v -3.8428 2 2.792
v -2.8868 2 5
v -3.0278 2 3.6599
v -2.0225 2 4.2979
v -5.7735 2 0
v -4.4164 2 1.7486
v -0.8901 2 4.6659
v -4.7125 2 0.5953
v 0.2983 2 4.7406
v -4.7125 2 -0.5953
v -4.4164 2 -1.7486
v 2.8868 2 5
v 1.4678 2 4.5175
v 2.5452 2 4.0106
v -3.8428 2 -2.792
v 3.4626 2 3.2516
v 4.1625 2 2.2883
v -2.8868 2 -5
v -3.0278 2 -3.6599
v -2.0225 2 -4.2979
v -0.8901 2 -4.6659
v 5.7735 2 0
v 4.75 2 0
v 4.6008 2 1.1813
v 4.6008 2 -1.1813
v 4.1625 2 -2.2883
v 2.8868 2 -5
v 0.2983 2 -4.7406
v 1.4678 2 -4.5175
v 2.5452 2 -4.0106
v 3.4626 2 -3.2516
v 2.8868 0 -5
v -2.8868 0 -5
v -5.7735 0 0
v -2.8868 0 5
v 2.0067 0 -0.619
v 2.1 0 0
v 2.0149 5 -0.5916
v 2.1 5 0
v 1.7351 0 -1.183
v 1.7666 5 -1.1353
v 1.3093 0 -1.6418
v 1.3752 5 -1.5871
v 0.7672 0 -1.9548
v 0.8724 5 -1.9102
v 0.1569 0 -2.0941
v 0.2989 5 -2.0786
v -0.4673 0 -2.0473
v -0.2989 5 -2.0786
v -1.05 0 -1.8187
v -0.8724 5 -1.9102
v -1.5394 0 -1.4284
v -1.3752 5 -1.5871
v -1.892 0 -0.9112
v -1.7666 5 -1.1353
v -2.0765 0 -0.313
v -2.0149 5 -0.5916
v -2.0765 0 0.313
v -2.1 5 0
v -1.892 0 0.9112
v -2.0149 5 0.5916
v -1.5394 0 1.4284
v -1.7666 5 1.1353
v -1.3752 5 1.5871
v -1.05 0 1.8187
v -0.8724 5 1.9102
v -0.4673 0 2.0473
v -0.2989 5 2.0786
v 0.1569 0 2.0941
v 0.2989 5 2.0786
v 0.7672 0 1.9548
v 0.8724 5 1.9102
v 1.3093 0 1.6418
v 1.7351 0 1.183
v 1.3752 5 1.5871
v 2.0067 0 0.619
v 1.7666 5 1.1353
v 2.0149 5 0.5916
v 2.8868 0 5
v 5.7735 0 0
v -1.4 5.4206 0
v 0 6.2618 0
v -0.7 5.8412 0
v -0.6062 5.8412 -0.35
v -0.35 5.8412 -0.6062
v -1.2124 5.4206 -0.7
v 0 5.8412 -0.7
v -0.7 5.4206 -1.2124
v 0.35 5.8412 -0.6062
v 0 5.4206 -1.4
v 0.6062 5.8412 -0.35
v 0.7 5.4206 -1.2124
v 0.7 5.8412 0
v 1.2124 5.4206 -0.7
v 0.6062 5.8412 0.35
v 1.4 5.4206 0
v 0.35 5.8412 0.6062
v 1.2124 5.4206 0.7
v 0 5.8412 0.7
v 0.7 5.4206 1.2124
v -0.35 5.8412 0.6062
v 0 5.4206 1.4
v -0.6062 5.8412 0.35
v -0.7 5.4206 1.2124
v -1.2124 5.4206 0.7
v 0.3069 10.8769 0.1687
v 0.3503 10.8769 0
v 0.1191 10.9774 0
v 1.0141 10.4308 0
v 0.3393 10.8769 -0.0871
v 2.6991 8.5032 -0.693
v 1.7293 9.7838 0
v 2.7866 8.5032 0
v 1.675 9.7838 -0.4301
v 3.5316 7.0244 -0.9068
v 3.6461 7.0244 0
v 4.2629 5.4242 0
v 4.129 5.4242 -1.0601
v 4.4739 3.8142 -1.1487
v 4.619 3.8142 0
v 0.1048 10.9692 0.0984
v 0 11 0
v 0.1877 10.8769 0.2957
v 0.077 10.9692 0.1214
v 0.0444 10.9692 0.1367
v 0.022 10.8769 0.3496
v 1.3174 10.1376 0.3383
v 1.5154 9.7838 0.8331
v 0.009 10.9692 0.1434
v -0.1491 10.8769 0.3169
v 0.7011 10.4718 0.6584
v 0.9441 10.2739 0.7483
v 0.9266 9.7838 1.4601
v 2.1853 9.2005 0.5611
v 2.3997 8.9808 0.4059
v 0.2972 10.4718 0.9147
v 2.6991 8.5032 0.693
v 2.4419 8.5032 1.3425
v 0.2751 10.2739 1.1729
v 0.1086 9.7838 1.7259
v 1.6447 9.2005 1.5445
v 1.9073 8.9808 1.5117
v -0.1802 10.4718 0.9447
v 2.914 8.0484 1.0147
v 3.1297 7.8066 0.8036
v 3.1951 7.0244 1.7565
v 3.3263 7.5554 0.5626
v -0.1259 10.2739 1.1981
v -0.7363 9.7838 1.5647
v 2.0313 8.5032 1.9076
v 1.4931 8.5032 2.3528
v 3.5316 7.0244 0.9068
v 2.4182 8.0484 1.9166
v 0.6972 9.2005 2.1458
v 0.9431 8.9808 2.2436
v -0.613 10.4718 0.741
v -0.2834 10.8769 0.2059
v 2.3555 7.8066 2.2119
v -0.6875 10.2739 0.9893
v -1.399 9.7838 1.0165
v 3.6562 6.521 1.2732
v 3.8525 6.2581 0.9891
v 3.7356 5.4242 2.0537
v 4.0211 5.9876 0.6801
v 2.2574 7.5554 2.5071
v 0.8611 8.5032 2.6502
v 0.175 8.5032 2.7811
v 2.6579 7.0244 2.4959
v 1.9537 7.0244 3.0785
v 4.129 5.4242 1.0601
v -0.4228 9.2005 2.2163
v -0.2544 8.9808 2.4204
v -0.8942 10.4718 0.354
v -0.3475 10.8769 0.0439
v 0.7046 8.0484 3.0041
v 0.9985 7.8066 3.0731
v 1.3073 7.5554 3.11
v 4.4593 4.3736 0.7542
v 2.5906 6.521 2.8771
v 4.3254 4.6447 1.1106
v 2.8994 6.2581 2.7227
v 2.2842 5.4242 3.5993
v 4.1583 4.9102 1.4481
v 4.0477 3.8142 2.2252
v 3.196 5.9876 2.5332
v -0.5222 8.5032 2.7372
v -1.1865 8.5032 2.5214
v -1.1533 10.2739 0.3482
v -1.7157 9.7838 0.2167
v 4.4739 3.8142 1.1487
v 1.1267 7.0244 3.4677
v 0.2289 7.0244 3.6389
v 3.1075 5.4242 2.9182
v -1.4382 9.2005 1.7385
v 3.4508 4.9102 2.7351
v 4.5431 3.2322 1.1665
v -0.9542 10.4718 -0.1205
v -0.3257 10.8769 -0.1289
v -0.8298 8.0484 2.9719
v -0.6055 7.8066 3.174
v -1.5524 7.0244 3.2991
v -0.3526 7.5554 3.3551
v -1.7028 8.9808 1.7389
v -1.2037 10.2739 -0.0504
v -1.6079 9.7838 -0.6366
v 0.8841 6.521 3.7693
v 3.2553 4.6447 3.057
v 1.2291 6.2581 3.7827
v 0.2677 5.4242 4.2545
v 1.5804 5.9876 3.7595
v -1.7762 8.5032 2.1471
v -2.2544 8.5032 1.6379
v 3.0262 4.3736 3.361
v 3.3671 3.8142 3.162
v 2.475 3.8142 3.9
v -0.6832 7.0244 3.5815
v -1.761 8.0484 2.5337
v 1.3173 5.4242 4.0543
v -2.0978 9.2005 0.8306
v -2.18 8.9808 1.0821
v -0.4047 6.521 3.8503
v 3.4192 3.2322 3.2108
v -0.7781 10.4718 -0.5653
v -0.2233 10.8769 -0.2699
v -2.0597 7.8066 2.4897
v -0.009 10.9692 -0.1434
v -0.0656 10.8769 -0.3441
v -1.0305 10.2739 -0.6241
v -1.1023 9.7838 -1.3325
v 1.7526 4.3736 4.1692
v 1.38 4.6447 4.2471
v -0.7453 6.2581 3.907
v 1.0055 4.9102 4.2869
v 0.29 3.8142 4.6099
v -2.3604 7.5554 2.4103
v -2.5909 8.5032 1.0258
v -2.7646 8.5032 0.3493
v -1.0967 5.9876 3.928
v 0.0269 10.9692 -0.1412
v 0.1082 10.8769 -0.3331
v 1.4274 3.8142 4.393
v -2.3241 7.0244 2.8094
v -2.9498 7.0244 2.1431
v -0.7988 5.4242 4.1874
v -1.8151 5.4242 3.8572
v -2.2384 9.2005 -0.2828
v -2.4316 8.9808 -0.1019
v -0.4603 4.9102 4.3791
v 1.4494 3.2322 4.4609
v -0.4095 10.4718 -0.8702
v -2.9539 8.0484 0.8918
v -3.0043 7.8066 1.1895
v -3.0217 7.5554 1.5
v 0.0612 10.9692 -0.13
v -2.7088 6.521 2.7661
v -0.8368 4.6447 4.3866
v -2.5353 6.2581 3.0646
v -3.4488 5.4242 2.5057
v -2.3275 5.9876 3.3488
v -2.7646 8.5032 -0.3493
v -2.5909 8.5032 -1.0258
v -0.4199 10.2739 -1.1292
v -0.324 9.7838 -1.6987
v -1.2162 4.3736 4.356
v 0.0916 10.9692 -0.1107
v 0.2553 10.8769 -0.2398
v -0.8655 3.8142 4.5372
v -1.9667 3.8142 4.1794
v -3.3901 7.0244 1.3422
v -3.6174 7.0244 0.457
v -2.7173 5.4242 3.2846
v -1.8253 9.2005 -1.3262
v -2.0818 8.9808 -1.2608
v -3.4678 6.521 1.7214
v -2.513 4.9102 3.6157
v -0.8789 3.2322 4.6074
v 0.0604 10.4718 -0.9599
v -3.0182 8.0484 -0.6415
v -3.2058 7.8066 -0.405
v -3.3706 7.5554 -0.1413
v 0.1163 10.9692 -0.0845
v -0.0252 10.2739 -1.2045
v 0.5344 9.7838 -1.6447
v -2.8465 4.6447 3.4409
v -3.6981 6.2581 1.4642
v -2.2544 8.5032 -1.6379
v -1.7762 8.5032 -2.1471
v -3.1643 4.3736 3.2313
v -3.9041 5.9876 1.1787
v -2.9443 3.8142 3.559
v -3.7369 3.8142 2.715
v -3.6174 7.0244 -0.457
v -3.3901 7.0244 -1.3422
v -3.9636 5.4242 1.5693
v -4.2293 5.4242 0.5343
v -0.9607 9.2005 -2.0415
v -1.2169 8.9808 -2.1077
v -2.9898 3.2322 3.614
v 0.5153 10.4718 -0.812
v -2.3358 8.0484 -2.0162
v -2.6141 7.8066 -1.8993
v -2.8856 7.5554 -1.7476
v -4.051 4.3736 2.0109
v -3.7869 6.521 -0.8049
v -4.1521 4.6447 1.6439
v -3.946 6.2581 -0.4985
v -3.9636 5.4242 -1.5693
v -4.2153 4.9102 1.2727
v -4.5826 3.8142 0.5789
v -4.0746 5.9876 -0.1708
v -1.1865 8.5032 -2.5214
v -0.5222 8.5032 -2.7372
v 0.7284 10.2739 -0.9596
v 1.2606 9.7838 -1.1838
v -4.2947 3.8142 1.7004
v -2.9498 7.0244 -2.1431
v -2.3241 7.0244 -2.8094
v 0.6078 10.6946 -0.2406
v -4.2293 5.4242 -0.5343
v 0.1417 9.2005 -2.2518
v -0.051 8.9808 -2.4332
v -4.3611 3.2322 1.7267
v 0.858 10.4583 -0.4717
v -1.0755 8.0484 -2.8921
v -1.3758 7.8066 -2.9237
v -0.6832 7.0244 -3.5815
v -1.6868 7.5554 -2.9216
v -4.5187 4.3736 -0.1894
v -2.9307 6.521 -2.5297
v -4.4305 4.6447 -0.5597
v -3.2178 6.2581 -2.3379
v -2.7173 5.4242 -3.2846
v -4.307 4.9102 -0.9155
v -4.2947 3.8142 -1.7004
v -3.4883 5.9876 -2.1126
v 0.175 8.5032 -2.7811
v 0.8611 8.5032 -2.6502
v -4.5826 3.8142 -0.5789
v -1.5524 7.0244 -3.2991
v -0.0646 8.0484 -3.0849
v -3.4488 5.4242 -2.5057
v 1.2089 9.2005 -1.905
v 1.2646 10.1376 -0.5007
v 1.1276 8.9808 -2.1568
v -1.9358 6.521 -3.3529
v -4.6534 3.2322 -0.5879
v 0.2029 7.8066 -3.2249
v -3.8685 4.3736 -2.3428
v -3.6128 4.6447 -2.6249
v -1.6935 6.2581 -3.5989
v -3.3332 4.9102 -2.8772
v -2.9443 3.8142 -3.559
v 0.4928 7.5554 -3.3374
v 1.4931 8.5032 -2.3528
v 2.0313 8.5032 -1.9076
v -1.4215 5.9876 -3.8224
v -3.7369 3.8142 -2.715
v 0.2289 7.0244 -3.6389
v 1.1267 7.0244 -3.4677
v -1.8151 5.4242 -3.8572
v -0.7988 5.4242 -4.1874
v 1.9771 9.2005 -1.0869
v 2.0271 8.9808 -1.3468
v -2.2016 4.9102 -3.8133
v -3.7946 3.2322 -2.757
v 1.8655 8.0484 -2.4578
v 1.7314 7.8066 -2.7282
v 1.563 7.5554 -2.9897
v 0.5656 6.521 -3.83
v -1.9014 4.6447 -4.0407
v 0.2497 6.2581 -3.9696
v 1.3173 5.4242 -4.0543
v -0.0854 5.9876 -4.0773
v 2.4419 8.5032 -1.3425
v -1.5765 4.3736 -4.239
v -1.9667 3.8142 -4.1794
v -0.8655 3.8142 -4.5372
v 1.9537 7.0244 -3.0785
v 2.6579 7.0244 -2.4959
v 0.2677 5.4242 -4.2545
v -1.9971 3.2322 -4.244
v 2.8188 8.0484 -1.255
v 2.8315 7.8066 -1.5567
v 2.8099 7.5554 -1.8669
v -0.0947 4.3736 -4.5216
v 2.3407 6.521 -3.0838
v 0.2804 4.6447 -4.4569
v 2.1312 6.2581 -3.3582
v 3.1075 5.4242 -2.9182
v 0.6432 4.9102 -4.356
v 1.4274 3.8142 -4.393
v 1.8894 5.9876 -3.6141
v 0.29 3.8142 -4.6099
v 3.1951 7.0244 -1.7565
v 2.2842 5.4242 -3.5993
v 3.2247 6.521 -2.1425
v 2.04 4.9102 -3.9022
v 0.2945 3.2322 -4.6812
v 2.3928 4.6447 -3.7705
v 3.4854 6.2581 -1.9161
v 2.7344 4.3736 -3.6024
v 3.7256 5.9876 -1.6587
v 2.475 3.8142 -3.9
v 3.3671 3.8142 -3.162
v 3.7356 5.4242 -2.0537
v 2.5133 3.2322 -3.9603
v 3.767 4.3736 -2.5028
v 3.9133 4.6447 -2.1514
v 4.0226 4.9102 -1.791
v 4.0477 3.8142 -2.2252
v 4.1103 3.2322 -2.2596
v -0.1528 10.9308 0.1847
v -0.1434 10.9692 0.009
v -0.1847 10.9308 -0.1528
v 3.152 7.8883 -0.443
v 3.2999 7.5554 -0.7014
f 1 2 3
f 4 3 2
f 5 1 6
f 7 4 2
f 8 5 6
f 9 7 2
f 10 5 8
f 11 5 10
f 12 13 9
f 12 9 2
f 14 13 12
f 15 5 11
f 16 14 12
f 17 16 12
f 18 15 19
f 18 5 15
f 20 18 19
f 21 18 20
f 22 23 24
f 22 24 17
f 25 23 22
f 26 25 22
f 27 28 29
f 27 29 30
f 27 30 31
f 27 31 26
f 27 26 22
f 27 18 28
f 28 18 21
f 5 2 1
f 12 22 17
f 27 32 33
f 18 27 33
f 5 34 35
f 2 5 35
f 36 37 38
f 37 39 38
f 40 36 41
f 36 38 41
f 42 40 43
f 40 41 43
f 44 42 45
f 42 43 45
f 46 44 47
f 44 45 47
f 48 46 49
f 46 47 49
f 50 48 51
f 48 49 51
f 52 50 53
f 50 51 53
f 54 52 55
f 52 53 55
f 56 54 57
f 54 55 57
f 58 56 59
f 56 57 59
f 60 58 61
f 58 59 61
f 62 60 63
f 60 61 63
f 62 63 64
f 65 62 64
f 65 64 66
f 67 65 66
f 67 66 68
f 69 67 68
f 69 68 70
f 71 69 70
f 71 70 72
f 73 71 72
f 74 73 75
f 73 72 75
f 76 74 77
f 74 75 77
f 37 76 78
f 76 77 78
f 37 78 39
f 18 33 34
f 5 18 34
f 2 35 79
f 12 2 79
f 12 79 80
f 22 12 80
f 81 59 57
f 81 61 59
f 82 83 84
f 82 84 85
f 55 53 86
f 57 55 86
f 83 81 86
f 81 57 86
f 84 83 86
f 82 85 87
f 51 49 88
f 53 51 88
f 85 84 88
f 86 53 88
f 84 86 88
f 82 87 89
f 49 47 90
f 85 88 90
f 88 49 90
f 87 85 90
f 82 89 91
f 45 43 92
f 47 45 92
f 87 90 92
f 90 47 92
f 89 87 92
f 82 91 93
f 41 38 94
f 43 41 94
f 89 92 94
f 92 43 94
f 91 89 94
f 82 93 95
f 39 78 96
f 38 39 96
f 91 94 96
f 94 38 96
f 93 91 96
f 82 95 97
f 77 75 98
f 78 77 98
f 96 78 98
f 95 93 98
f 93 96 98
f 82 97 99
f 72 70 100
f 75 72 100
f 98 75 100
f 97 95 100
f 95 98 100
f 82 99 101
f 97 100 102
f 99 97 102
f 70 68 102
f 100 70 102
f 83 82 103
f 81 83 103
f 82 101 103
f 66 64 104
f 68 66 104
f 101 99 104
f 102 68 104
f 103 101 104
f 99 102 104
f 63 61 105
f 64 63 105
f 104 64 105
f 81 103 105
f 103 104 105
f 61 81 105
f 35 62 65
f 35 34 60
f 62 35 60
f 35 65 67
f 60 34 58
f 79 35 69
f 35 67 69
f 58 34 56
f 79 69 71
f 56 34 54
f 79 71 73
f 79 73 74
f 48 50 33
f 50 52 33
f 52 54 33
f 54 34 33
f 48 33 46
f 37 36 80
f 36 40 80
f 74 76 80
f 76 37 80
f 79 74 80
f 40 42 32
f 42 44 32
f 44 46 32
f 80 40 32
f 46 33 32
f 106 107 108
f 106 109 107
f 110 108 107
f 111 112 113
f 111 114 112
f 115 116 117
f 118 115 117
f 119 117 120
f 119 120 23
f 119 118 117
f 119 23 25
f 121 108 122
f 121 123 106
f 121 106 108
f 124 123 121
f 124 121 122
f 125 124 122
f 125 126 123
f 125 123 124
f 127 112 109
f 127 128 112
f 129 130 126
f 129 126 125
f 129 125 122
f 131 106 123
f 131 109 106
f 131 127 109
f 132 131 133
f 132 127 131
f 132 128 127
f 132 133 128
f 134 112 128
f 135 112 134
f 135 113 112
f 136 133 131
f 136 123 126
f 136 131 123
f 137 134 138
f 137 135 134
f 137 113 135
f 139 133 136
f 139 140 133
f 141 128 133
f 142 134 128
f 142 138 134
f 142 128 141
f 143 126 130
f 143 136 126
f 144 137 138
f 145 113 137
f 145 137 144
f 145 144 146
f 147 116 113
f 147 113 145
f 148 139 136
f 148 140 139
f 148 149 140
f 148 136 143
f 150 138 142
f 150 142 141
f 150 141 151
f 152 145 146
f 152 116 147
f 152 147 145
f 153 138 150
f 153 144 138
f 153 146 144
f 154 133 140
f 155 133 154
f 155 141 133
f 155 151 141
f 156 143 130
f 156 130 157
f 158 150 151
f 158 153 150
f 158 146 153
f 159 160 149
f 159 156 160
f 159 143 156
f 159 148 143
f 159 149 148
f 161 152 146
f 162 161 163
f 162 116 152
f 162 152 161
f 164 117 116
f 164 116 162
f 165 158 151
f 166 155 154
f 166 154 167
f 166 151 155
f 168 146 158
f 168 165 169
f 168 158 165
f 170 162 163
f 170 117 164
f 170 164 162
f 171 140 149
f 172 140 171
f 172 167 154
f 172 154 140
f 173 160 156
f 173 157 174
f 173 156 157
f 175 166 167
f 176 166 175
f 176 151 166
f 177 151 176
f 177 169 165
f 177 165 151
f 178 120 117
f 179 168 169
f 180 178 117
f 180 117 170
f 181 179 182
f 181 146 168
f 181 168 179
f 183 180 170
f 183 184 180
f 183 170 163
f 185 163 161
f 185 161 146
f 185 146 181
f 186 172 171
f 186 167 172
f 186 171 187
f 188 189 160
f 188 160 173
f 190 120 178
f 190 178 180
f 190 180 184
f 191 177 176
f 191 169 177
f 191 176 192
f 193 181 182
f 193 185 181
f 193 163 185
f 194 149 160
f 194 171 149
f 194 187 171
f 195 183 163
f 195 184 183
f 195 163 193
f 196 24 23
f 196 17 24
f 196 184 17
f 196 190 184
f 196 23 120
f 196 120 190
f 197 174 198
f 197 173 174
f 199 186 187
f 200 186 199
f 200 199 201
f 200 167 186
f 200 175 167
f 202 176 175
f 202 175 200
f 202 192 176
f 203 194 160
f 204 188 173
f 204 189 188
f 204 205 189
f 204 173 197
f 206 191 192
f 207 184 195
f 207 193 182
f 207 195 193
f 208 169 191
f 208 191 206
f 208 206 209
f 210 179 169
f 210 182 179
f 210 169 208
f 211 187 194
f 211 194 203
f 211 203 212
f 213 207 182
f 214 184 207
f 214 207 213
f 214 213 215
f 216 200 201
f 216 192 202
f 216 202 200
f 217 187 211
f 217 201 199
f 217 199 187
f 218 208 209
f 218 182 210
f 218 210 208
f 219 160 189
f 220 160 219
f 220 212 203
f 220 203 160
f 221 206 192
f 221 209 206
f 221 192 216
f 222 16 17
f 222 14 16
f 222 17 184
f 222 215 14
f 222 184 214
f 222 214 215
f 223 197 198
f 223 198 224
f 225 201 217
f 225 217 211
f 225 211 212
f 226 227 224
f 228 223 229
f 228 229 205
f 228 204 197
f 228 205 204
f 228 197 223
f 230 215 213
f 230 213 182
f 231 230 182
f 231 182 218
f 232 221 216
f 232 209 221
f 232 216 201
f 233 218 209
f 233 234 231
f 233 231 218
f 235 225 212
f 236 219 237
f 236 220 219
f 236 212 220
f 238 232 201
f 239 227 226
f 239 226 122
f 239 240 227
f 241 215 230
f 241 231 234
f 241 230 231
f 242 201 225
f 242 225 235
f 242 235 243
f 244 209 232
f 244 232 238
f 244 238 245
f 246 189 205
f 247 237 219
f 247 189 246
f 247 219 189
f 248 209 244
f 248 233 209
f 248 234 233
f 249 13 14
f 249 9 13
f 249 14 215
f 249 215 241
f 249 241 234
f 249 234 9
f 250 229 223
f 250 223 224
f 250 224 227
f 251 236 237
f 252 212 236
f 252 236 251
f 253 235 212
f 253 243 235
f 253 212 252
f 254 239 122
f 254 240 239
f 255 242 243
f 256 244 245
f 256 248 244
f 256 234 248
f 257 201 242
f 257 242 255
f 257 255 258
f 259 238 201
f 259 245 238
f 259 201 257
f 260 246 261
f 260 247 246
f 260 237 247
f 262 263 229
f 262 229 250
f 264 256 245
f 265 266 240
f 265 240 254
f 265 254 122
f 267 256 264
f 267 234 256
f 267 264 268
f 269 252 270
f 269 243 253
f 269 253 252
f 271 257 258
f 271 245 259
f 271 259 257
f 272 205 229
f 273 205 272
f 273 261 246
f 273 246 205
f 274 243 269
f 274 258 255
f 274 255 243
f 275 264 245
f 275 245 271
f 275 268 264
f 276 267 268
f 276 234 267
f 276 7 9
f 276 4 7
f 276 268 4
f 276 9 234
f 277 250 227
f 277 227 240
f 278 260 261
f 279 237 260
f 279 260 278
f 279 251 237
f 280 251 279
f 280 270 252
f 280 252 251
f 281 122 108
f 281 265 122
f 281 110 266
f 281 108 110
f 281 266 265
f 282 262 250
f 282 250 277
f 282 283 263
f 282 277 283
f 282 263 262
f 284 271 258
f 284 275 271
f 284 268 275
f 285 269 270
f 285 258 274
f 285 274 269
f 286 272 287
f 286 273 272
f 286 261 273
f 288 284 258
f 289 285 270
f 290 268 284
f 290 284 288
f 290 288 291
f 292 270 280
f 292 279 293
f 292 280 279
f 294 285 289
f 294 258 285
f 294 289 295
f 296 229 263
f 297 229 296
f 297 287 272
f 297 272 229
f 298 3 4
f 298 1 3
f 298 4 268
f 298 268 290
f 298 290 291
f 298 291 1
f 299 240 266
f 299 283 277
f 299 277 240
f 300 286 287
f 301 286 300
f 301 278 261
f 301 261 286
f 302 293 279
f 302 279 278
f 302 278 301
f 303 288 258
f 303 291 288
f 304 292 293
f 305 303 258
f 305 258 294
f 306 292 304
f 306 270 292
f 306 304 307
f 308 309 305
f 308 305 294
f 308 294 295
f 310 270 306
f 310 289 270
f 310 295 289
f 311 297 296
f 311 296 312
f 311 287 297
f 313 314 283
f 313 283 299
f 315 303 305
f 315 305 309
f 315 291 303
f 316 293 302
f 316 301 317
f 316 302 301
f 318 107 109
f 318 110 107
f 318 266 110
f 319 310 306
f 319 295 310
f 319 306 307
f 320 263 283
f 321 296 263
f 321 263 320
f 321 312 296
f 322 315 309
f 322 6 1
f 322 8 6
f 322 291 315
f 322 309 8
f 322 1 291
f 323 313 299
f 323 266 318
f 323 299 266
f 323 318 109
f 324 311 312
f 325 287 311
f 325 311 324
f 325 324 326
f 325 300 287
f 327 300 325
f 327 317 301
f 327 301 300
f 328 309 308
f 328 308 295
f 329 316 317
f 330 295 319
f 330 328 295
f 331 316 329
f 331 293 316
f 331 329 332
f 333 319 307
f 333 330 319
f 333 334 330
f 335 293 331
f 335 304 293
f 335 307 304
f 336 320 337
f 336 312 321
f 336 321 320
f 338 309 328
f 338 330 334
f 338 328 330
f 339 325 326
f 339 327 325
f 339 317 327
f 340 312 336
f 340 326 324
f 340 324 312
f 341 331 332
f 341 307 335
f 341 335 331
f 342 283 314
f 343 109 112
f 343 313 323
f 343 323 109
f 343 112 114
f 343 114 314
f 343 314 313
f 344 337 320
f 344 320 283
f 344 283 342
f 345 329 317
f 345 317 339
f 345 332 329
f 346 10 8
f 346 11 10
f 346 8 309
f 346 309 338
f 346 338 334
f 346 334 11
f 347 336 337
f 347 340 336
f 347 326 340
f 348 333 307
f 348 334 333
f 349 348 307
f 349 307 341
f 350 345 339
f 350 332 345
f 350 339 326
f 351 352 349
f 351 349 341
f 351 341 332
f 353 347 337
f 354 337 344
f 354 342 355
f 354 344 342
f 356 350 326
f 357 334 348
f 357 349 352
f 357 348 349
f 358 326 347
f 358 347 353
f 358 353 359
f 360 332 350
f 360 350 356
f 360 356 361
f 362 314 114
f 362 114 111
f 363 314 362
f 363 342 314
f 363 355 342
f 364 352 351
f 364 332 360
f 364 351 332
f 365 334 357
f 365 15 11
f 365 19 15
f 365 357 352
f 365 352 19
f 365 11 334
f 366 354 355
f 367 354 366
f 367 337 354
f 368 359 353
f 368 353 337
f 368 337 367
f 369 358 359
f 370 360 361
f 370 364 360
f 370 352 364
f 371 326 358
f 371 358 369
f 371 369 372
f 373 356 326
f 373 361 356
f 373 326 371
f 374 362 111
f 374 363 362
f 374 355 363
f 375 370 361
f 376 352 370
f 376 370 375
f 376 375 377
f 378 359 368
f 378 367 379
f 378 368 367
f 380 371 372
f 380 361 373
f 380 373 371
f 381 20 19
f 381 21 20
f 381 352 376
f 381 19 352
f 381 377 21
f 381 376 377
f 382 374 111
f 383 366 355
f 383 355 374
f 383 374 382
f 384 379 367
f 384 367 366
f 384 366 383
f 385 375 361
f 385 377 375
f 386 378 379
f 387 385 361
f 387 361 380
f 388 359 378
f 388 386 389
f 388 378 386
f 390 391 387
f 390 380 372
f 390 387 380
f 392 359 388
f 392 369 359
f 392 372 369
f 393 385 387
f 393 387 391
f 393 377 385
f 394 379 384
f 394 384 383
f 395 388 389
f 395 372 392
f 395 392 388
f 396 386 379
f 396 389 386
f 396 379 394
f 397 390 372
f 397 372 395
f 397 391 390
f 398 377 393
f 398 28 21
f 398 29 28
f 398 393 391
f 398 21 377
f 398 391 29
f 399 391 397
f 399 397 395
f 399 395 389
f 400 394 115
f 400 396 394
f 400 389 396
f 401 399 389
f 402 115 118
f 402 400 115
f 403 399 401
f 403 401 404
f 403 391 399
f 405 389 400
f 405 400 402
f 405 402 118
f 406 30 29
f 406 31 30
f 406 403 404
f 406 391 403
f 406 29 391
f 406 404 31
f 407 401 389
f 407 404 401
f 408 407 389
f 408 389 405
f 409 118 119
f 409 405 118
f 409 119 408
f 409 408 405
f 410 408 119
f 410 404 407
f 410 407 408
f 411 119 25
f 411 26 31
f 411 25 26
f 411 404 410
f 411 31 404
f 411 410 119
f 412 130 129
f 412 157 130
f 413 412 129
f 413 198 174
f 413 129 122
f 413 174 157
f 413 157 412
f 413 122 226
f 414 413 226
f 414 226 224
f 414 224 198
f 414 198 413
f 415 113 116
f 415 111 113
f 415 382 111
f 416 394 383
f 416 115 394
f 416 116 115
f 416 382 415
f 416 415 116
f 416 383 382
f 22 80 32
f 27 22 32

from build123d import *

# Parameters (mm, degrees)
BOSS_EXTRUDE1_DEPTH       = 2
M5X0_8_TAPPED_HOLE1_D     = 4.2
M5X0_8_TAPPED_HOLE1_DEPTH = 5
M5X0_8_TAPPED_HOLE1_TIP   = 1.2618073


with BuildPart() as part:
    # Sketch1 → Boss-Extrude1 (new body)
    with BuildSketch(Plane(origin=(0, 0, 0), x_dir=(1, 0, 0), z_dir=(0, 1, 0))):
        Polygon((2.886751346, 5), (-2.886751346, 5), (-5.773502692, 0), (-2.886751346, -5), (2.886751346, -5), (5.773502692, 0), align=None)
    extrude(amount=BOSS_EXTRUDE1_DEPTH)

    # Sketch2 → Revolve1 (revolve)
    with BuildSketch(Plane.XY):
        with BuildLine():
            Line((4.75, 2), (0, 2))
            Line((0, 2), (0, 11))
            add(Edge.make_bspline(
                [(0, 11), (0.622499022, 11), (4.75, 8.004236855), (4.75, 2)],
                knots=[0, 0, 0, 0, 1, 1, 1, 1], degree=3))
        make_face()
    revolve(axis=Axis((0, 11, 0), (0, -1, 0)))

    # M5x0.8 Tapped Hole1
    with Locations(Plane(origin=(0, 0, 0), x_dir=(-1, 0, 0), z_dir=(0, -1, 0))):
        with Locations((0, 0)):
            Hole(M5X0_8_TAPPED_HOLE1_D / 2, depth=M5X0_8_TAPPED_HOLE1_DEPTH)
            with Locations((0, 0, -(M5X0_8_TAPPED_HOLE1_DEPTH + M5X0_8_TAPPED_HOLE1_TIP / 2))):  # 118° drill point
                Cone(0, M5X0_8_TAPPED_HOLE1_D / 2, M5X0_8_TAPPED_HOLE1_TIP, mode=Mode.SUBTRACT)


solid = part.part
